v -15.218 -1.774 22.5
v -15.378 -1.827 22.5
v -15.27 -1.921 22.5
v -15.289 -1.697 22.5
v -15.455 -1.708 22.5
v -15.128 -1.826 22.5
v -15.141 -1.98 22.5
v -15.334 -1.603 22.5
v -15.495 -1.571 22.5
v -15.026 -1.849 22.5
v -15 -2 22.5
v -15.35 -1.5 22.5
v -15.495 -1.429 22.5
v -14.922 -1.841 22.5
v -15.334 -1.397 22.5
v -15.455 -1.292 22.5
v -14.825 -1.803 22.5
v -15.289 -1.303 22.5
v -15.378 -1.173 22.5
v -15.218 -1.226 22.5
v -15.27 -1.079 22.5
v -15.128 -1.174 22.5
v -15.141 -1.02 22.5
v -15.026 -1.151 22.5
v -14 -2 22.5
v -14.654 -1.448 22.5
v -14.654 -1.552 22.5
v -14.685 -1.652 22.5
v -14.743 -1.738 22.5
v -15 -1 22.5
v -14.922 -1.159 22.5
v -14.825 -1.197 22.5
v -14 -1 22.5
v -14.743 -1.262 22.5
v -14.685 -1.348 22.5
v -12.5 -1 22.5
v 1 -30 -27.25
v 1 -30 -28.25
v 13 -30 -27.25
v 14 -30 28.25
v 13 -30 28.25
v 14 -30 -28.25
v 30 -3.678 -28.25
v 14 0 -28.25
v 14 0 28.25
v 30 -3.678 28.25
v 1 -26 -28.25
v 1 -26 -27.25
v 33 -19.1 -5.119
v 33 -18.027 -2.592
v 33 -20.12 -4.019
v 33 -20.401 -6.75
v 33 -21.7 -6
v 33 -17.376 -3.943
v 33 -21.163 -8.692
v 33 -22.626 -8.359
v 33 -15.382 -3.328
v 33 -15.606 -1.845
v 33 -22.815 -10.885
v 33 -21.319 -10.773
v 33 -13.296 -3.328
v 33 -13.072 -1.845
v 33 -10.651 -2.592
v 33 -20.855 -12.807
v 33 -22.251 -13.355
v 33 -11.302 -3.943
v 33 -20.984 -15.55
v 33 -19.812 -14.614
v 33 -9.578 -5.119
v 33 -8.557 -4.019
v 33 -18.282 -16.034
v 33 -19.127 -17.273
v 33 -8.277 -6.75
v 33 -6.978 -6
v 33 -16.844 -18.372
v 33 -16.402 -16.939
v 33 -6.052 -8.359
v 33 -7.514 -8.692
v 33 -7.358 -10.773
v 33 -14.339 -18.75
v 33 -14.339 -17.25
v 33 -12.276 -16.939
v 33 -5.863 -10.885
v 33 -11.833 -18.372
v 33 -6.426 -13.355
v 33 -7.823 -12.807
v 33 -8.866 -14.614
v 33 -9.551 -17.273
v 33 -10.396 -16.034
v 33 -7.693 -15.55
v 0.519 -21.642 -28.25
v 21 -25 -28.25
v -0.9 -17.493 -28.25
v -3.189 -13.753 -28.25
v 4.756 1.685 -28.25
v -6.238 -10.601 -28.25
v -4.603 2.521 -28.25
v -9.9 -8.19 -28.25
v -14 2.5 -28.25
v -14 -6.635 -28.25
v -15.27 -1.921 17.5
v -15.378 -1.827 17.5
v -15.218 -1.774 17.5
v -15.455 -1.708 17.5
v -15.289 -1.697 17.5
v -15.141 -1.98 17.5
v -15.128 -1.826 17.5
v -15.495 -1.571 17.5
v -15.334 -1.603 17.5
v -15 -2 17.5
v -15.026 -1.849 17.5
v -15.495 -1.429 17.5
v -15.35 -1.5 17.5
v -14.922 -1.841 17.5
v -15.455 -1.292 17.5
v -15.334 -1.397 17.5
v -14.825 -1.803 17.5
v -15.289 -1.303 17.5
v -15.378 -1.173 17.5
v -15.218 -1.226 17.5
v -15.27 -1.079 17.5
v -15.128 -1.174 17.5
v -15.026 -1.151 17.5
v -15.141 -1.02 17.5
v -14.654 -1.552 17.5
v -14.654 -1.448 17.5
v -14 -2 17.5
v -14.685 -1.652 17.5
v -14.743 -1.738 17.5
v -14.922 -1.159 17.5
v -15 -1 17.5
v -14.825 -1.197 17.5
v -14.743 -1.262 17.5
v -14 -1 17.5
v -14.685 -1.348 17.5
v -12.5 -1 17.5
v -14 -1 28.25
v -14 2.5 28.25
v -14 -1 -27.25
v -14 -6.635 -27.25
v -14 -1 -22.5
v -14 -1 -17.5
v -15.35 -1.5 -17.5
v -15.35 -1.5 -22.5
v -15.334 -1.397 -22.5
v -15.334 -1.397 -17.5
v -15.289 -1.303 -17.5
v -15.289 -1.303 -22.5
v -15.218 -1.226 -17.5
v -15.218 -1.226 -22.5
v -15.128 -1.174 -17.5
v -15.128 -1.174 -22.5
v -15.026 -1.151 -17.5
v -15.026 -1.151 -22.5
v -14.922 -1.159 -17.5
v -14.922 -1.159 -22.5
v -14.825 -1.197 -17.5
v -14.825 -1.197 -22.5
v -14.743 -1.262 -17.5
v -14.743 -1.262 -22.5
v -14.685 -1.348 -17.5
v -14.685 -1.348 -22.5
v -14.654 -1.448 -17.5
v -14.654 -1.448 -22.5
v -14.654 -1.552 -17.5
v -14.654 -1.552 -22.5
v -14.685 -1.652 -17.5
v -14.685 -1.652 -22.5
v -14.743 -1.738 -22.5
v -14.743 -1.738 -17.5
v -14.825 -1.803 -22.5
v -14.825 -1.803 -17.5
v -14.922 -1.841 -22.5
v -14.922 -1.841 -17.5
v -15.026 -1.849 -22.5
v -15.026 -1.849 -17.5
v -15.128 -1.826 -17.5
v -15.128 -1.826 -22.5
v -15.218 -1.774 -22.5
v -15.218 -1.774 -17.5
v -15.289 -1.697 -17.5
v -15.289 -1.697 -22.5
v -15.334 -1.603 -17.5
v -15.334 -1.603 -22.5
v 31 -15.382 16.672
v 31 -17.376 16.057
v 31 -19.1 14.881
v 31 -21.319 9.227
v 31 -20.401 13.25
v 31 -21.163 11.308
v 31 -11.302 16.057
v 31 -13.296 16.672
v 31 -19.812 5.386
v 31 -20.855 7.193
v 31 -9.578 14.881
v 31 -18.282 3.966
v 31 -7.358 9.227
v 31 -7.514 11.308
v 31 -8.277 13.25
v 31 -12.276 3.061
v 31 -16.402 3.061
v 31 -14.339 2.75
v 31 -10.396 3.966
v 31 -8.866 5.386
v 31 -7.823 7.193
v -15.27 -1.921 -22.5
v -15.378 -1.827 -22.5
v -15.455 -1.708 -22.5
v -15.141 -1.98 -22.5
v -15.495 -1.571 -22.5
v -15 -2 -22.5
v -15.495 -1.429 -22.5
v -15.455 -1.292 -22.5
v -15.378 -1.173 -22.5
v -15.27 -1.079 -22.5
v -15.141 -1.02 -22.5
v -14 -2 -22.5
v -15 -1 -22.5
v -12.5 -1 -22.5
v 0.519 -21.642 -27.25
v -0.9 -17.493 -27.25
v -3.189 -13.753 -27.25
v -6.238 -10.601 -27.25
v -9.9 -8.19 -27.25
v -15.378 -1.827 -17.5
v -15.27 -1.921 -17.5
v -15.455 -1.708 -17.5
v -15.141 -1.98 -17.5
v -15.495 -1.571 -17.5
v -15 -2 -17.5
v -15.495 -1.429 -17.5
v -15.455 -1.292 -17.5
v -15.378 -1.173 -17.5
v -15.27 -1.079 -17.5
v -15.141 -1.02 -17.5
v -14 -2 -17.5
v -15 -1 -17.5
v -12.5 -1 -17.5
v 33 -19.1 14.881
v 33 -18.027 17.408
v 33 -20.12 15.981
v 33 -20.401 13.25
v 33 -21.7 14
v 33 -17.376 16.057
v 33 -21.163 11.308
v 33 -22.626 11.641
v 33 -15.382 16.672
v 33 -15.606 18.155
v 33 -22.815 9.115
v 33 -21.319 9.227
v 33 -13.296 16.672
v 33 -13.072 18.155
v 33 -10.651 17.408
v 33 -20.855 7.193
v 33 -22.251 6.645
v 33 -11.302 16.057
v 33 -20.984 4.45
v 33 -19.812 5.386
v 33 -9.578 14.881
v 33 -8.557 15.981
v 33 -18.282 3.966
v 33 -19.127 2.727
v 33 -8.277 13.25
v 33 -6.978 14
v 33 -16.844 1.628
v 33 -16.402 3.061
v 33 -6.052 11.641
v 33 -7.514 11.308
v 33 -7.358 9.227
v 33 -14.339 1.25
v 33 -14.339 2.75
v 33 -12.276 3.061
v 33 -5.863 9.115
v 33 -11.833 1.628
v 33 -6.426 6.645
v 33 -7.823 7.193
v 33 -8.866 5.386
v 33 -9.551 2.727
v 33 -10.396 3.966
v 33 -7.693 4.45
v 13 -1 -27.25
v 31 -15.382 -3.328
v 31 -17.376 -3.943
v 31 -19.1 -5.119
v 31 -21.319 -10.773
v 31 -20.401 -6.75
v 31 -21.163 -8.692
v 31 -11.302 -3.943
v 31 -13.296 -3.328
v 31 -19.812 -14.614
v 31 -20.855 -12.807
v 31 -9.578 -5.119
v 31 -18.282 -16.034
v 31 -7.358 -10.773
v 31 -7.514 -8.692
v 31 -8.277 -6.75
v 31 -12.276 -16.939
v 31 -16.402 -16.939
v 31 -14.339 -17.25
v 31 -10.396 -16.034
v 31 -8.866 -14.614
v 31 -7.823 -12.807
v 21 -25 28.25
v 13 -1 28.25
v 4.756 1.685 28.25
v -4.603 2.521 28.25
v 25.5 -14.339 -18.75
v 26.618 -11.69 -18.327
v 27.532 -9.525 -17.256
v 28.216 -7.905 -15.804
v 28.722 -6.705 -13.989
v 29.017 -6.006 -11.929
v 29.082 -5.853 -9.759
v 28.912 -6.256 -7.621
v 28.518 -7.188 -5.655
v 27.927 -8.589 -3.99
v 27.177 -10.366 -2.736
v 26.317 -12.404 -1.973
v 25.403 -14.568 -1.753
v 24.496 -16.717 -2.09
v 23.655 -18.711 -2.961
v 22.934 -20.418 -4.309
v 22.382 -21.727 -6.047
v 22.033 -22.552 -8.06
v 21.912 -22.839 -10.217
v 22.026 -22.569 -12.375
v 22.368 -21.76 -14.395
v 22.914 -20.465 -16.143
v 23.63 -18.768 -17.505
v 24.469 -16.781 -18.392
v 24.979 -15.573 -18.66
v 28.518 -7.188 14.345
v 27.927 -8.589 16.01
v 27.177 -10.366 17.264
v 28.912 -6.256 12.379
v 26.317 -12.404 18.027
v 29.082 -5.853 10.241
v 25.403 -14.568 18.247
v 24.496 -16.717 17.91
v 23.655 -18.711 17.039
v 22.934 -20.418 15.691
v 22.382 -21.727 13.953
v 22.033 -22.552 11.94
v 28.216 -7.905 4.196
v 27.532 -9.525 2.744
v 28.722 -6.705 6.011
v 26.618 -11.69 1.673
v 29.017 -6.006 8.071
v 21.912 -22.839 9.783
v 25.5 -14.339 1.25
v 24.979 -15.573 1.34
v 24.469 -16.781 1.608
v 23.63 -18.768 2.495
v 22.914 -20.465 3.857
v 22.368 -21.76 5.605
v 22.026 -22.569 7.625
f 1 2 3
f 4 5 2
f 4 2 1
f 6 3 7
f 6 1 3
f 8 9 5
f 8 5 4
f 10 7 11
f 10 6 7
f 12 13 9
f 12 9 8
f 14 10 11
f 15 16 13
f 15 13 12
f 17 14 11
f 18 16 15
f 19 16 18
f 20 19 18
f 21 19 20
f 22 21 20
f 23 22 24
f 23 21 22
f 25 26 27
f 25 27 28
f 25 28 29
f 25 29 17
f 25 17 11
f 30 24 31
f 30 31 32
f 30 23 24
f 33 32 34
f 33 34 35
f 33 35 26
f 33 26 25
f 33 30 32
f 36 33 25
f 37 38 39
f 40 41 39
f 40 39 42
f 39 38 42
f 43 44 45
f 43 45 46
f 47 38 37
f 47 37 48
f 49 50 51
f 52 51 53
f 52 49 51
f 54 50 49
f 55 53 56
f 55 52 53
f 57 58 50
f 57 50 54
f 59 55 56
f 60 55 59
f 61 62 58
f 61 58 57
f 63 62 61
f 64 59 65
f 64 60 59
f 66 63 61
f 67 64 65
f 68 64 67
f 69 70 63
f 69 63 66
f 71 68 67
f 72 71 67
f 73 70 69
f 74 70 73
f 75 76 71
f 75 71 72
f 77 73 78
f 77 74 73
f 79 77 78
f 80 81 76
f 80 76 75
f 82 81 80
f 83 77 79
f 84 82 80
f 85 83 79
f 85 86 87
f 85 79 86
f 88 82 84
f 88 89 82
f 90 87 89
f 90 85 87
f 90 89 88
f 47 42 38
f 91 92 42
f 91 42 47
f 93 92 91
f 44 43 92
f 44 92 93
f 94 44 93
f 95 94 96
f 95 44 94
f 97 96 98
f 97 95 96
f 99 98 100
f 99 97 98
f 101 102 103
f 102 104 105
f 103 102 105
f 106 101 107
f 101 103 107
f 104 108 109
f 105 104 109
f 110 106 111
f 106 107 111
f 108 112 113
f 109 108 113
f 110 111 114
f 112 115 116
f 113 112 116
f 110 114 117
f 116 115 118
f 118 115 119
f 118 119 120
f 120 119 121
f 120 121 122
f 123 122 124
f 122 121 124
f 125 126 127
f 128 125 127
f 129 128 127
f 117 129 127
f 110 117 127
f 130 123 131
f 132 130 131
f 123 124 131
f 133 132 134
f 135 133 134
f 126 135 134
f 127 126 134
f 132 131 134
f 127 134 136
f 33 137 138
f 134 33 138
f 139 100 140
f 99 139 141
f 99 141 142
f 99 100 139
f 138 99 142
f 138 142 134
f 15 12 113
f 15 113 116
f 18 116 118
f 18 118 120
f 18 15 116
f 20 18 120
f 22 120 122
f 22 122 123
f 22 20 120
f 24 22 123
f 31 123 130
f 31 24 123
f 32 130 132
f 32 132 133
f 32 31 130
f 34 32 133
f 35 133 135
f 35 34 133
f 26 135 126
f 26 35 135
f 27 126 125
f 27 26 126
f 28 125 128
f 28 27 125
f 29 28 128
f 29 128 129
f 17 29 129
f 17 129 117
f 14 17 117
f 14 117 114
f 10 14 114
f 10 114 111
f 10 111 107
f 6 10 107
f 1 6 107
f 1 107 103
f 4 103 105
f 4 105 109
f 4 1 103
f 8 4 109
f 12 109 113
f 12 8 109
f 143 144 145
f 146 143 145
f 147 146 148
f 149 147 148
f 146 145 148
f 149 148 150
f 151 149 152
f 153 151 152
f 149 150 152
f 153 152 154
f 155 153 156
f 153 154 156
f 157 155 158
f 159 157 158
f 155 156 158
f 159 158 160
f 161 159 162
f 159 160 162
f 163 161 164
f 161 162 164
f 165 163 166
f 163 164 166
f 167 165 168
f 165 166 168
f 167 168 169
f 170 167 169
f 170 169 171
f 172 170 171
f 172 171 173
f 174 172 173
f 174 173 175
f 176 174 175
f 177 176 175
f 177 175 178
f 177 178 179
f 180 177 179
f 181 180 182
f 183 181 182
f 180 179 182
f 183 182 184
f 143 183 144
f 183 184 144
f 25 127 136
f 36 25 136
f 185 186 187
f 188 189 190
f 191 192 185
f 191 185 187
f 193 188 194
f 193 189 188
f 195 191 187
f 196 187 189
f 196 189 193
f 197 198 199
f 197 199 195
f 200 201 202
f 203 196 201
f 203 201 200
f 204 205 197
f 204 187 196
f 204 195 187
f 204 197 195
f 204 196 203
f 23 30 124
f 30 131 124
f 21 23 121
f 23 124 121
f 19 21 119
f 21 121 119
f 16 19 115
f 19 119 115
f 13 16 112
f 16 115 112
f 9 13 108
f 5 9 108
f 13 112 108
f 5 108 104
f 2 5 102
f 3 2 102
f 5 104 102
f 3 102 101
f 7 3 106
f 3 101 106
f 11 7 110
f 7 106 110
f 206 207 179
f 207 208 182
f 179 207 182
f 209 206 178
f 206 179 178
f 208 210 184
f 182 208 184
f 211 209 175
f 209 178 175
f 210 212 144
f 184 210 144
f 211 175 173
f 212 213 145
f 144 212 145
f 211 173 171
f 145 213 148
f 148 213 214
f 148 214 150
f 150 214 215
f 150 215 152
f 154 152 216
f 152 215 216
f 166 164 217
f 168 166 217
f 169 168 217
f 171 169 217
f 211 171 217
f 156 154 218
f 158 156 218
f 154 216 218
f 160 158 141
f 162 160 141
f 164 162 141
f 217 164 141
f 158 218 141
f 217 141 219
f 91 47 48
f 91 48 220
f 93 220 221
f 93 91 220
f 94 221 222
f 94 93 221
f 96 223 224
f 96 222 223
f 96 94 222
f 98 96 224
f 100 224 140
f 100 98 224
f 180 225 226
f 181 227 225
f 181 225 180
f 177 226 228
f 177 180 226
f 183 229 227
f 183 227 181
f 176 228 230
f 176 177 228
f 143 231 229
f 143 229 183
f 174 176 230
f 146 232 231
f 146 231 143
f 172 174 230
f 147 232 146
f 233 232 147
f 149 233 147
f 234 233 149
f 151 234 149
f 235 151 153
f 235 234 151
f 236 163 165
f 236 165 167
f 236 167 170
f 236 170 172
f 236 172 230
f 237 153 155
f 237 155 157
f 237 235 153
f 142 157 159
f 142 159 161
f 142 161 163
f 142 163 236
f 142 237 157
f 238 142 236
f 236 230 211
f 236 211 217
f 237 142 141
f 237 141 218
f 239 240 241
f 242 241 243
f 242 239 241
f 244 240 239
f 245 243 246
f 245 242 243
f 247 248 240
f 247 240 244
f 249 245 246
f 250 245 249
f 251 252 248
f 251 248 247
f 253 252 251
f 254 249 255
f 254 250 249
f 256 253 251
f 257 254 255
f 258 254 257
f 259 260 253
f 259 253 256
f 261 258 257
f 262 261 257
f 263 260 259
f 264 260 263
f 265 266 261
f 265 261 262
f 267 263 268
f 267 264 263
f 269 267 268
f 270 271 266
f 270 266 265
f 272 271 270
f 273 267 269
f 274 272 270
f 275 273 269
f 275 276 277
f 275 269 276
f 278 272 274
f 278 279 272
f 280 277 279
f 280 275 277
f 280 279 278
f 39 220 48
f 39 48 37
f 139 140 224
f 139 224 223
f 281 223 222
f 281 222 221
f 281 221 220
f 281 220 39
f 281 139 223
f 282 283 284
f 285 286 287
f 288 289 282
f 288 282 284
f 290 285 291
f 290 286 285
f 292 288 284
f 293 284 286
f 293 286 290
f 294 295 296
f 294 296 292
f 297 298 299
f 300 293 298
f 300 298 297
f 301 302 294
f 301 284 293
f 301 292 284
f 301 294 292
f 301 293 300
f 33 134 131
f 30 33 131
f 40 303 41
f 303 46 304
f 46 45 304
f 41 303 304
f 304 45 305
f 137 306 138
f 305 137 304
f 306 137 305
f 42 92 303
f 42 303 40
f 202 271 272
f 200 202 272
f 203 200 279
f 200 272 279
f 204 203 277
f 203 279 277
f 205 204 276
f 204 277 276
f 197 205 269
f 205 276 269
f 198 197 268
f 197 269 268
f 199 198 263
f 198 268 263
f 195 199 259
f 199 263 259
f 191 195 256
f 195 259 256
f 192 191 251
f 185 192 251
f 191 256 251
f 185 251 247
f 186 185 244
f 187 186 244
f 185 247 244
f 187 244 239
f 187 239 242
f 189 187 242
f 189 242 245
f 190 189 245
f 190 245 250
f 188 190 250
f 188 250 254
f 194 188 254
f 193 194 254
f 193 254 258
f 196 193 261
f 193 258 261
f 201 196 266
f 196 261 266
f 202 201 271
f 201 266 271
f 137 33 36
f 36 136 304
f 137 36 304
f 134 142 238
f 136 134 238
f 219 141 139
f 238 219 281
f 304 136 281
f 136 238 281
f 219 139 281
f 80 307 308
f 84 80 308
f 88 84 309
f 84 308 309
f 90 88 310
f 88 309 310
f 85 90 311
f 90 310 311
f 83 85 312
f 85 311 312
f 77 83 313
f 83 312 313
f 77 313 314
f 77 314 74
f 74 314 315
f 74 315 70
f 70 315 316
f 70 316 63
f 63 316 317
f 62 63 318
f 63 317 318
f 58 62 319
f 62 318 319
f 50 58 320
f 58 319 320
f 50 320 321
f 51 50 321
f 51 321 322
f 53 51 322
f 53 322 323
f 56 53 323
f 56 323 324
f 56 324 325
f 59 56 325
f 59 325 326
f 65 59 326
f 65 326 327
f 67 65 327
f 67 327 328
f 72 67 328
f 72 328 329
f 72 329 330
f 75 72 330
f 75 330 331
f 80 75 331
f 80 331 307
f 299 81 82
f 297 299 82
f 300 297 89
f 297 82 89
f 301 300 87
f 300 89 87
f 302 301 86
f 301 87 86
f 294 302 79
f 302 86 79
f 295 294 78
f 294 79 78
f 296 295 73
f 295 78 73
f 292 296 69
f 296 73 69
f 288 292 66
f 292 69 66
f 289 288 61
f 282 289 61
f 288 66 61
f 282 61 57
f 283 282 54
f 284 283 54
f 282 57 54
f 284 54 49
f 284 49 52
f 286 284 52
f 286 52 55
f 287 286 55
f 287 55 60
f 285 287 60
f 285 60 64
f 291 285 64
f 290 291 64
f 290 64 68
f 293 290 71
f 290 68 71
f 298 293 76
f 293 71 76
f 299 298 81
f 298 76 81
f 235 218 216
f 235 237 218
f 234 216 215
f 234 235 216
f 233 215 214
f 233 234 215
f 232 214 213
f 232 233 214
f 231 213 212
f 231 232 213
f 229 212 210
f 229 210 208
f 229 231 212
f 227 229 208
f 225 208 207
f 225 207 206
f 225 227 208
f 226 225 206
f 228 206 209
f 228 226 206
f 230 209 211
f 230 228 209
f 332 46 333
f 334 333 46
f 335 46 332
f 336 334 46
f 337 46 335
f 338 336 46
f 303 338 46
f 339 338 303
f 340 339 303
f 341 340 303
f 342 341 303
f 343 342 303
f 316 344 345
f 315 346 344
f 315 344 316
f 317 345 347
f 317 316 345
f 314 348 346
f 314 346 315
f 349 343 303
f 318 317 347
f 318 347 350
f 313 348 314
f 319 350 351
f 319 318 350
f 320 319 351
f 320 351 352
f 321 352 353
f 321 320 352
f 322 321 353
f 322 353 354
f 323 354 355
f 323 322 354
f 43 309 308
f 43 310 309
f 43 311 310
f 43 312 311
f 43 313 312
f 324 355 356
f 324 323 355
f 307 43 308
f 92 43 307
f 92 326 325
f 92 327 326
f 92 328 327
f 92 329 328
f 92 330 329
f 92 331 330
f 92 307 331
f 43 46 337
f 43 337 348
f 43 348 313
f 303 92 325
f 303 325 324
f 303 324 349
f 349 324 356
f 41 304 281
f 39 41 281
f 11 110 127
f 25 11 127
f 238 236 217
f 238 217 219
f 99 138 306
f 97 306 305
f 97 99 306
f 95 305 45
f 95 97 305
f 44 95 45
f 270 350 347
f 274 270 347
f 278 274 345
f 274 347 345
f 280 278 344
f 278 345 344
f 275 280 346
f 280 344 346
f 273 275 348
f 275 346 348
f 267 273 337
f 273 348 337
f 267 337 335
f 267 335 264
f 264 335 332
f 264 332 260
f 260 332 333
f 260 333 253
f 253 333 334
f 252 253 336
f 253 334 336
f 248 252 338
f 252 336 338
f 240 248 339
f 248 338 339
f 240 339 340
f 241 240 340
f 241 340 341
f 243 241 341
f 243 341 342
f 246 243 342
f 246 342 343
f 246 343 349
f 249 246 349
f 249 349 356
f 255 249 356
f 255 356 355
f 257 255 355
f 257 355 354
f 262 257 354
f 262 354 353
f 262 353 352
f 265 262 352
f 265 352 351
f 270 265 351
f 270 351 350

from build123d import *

# Parameters (mm, degrees)
SKETCH1_W           = 28
SKETCH1_H           = 56.5
BOSS_EXTRUDE1_DEPTH = 30
CUT_EXTRUDE2_DEPTH  = 56.5
SHELL1_T            = -1
BOSS_EXTRUDE3_DEPTH = 2.5
SKETCH4_R           = 0.35
CUT_EXTRUDE1_DEPTH  = 5
BOSS_EXTRUDE4_DEPTH = 56.5
BOSS_EXTRUDE5_START = -11.087816
SKETCH7_R           = 8.5
BOSS_EXTRUDE5_DEPTH = 11.087816
SKETCH8_R           = 7
CUT_EXTRUDE3_DEPTH  = 2
LPATTERN1_COUNT     = 2
LPATTERN1_PITCH     = 20


with BuildPart() as part:
    # Sketch1 → Boss-Extrude1 (new body)
    with BuildSketch(Plane(origin=(0, 0, 0), x_dir=(1, 0, 0), z_dir=(0, 1, 0))):
        Rectangle(SKETCH1_W, SKETCH1_H)
    extrude(amount=-BOSS_EXTRUDE1_DEPTH)

    # Sketch5 → Cut-Extrude2 (cut)
    with BuildSketch(Plane(origin=(0, 0, -28.25), x_dir=(-1, 0, 0), z_dir=(0, 0, -1))):
        with BuildLine():
            Line((-1, -30), (-1, -26))
            ThreePointArc((-1, -26), (3.188611699, -13.752551286), (14, -6.635083269))
            Line((14, -6.635083269), (14, -30))
            Line((14, -30), (-1, -30))
        make_face()
    extrude(amount=-CUT_EXTRUDE2_DEPTH, mode=Mode.SUBTRACT)

    # Shell1
    shell1_openings = [part.faces().sort_by_distance(p)[0] for p in [
        (7.5, -30, 0),
        (0.885231383, -15.011682153, 28.25),
        (-14, -3.317541634, 0),
        (-4.84430585, -15.03504646, 0),
        (1, -28, 0),
    ]]
    offset(amount=SHELL1_T, openings=shell1_openings, kind=Kind.INTERSECTION)

    # Sketch3 → Boss-Extrude3 (add, symmetric)
    with BuildSketch(Plane.XY.offset(-20)):
        with BuildLine():
            Line((-14, -1), (-15, -1))
            ThreePointArc((-15, -1), (-15.5, -1.5), (-15, -2))
            Line((-15, -2), (-14, -2))
            Line((-14, -2), (-12.5, -1))
            Line((-12.5, -1), (-14, -1))
        make_face()
    boss_extrude3 = extrude(amount=BOSS_EXTRUDE3_DEPTH, both=True)

    # Sketch4 → Cut-Extrude1 (cut)
    with BuildSketch(Plane(origin=(0, 0, -22.5), x_dir=(-1, 0, 0), z_dir=(0, 0, -1))):
        with Locations((15, -1.5)):
            Circle(SKETCH4_R)
    cut_extrude1 = extrude(amount=-CUT_EXTRUDE1_DEPTH, mode=Mode.SUBTRACT)

    # Mirror1: Boss-Extrude3, Cut-Extrude1 across plane
    add(boss_extrude3.mirror(Plane.XY))
    add(cut_extrude1.mirror(Plane.XY), mode=Mode.SUBTRACT)

    # Sketch6 → Boss-Extrude4 (add)
    with BuildSketch(Plane(origin=(0, 0, -28.25), x_dir=(-1, 0, 0), z_dir=(0, 0, -1))):
        Polygon((-30, -3.677832944), (-21, -25), (-14, -30), (-14, 0), align=None)
        with BuildLine():
            Line((14, 0), (14, 2.5))
            ThreePointArc((14, 2.5), (-0.085690207, 2.209730318), (-14, 0))
            Line((-14, 0), (14, 0))
        make_face()
    extrude(amount=-BOSS_EXTRUDE4_DEPTH)

    # Sketch7 → Boss-Extrude5 (add)
    with BuildSketch(Plane(origin=(33, 0, 0), x_dir=(0, 0, -1), z_dir=(1, 0, 0)).offset(BOSS_EXTRUDE5_START)):
        with Locations((10.25, -14.338916472)):
            Circle(SKETCH7_R)
    boss_extrude5 = extrude(amount=BOSS_EXTRUDE5_DEPTH)

    # Sketch8 → Cut-Extrude3 (cut)
    with BuildSketch(Plane(origin=(33, 0, 0), x_dir=(0, 0, -1), z_dir=(1, 0, 0))):
        with Locations((10.25, -14.338916472)):
            Circle(SKETCH8_R)
    cut_extrude3 = extrude(amount=-CUT_EXTRUDE3_DEPTH, mode=Mode.SUBTRACT)

    # LPattern1: Boss-Extrude5, Cut-Extrude3 ×2
    with Locations(*[(0, 0, i * LPATTERN1_PITCH) for i in range(1, LPATTERN1_COUNT)]):
        add(boss_extrude5)
        add(cut_extrude3, mode=Mode.SUBTRACT)


solid = part.part
